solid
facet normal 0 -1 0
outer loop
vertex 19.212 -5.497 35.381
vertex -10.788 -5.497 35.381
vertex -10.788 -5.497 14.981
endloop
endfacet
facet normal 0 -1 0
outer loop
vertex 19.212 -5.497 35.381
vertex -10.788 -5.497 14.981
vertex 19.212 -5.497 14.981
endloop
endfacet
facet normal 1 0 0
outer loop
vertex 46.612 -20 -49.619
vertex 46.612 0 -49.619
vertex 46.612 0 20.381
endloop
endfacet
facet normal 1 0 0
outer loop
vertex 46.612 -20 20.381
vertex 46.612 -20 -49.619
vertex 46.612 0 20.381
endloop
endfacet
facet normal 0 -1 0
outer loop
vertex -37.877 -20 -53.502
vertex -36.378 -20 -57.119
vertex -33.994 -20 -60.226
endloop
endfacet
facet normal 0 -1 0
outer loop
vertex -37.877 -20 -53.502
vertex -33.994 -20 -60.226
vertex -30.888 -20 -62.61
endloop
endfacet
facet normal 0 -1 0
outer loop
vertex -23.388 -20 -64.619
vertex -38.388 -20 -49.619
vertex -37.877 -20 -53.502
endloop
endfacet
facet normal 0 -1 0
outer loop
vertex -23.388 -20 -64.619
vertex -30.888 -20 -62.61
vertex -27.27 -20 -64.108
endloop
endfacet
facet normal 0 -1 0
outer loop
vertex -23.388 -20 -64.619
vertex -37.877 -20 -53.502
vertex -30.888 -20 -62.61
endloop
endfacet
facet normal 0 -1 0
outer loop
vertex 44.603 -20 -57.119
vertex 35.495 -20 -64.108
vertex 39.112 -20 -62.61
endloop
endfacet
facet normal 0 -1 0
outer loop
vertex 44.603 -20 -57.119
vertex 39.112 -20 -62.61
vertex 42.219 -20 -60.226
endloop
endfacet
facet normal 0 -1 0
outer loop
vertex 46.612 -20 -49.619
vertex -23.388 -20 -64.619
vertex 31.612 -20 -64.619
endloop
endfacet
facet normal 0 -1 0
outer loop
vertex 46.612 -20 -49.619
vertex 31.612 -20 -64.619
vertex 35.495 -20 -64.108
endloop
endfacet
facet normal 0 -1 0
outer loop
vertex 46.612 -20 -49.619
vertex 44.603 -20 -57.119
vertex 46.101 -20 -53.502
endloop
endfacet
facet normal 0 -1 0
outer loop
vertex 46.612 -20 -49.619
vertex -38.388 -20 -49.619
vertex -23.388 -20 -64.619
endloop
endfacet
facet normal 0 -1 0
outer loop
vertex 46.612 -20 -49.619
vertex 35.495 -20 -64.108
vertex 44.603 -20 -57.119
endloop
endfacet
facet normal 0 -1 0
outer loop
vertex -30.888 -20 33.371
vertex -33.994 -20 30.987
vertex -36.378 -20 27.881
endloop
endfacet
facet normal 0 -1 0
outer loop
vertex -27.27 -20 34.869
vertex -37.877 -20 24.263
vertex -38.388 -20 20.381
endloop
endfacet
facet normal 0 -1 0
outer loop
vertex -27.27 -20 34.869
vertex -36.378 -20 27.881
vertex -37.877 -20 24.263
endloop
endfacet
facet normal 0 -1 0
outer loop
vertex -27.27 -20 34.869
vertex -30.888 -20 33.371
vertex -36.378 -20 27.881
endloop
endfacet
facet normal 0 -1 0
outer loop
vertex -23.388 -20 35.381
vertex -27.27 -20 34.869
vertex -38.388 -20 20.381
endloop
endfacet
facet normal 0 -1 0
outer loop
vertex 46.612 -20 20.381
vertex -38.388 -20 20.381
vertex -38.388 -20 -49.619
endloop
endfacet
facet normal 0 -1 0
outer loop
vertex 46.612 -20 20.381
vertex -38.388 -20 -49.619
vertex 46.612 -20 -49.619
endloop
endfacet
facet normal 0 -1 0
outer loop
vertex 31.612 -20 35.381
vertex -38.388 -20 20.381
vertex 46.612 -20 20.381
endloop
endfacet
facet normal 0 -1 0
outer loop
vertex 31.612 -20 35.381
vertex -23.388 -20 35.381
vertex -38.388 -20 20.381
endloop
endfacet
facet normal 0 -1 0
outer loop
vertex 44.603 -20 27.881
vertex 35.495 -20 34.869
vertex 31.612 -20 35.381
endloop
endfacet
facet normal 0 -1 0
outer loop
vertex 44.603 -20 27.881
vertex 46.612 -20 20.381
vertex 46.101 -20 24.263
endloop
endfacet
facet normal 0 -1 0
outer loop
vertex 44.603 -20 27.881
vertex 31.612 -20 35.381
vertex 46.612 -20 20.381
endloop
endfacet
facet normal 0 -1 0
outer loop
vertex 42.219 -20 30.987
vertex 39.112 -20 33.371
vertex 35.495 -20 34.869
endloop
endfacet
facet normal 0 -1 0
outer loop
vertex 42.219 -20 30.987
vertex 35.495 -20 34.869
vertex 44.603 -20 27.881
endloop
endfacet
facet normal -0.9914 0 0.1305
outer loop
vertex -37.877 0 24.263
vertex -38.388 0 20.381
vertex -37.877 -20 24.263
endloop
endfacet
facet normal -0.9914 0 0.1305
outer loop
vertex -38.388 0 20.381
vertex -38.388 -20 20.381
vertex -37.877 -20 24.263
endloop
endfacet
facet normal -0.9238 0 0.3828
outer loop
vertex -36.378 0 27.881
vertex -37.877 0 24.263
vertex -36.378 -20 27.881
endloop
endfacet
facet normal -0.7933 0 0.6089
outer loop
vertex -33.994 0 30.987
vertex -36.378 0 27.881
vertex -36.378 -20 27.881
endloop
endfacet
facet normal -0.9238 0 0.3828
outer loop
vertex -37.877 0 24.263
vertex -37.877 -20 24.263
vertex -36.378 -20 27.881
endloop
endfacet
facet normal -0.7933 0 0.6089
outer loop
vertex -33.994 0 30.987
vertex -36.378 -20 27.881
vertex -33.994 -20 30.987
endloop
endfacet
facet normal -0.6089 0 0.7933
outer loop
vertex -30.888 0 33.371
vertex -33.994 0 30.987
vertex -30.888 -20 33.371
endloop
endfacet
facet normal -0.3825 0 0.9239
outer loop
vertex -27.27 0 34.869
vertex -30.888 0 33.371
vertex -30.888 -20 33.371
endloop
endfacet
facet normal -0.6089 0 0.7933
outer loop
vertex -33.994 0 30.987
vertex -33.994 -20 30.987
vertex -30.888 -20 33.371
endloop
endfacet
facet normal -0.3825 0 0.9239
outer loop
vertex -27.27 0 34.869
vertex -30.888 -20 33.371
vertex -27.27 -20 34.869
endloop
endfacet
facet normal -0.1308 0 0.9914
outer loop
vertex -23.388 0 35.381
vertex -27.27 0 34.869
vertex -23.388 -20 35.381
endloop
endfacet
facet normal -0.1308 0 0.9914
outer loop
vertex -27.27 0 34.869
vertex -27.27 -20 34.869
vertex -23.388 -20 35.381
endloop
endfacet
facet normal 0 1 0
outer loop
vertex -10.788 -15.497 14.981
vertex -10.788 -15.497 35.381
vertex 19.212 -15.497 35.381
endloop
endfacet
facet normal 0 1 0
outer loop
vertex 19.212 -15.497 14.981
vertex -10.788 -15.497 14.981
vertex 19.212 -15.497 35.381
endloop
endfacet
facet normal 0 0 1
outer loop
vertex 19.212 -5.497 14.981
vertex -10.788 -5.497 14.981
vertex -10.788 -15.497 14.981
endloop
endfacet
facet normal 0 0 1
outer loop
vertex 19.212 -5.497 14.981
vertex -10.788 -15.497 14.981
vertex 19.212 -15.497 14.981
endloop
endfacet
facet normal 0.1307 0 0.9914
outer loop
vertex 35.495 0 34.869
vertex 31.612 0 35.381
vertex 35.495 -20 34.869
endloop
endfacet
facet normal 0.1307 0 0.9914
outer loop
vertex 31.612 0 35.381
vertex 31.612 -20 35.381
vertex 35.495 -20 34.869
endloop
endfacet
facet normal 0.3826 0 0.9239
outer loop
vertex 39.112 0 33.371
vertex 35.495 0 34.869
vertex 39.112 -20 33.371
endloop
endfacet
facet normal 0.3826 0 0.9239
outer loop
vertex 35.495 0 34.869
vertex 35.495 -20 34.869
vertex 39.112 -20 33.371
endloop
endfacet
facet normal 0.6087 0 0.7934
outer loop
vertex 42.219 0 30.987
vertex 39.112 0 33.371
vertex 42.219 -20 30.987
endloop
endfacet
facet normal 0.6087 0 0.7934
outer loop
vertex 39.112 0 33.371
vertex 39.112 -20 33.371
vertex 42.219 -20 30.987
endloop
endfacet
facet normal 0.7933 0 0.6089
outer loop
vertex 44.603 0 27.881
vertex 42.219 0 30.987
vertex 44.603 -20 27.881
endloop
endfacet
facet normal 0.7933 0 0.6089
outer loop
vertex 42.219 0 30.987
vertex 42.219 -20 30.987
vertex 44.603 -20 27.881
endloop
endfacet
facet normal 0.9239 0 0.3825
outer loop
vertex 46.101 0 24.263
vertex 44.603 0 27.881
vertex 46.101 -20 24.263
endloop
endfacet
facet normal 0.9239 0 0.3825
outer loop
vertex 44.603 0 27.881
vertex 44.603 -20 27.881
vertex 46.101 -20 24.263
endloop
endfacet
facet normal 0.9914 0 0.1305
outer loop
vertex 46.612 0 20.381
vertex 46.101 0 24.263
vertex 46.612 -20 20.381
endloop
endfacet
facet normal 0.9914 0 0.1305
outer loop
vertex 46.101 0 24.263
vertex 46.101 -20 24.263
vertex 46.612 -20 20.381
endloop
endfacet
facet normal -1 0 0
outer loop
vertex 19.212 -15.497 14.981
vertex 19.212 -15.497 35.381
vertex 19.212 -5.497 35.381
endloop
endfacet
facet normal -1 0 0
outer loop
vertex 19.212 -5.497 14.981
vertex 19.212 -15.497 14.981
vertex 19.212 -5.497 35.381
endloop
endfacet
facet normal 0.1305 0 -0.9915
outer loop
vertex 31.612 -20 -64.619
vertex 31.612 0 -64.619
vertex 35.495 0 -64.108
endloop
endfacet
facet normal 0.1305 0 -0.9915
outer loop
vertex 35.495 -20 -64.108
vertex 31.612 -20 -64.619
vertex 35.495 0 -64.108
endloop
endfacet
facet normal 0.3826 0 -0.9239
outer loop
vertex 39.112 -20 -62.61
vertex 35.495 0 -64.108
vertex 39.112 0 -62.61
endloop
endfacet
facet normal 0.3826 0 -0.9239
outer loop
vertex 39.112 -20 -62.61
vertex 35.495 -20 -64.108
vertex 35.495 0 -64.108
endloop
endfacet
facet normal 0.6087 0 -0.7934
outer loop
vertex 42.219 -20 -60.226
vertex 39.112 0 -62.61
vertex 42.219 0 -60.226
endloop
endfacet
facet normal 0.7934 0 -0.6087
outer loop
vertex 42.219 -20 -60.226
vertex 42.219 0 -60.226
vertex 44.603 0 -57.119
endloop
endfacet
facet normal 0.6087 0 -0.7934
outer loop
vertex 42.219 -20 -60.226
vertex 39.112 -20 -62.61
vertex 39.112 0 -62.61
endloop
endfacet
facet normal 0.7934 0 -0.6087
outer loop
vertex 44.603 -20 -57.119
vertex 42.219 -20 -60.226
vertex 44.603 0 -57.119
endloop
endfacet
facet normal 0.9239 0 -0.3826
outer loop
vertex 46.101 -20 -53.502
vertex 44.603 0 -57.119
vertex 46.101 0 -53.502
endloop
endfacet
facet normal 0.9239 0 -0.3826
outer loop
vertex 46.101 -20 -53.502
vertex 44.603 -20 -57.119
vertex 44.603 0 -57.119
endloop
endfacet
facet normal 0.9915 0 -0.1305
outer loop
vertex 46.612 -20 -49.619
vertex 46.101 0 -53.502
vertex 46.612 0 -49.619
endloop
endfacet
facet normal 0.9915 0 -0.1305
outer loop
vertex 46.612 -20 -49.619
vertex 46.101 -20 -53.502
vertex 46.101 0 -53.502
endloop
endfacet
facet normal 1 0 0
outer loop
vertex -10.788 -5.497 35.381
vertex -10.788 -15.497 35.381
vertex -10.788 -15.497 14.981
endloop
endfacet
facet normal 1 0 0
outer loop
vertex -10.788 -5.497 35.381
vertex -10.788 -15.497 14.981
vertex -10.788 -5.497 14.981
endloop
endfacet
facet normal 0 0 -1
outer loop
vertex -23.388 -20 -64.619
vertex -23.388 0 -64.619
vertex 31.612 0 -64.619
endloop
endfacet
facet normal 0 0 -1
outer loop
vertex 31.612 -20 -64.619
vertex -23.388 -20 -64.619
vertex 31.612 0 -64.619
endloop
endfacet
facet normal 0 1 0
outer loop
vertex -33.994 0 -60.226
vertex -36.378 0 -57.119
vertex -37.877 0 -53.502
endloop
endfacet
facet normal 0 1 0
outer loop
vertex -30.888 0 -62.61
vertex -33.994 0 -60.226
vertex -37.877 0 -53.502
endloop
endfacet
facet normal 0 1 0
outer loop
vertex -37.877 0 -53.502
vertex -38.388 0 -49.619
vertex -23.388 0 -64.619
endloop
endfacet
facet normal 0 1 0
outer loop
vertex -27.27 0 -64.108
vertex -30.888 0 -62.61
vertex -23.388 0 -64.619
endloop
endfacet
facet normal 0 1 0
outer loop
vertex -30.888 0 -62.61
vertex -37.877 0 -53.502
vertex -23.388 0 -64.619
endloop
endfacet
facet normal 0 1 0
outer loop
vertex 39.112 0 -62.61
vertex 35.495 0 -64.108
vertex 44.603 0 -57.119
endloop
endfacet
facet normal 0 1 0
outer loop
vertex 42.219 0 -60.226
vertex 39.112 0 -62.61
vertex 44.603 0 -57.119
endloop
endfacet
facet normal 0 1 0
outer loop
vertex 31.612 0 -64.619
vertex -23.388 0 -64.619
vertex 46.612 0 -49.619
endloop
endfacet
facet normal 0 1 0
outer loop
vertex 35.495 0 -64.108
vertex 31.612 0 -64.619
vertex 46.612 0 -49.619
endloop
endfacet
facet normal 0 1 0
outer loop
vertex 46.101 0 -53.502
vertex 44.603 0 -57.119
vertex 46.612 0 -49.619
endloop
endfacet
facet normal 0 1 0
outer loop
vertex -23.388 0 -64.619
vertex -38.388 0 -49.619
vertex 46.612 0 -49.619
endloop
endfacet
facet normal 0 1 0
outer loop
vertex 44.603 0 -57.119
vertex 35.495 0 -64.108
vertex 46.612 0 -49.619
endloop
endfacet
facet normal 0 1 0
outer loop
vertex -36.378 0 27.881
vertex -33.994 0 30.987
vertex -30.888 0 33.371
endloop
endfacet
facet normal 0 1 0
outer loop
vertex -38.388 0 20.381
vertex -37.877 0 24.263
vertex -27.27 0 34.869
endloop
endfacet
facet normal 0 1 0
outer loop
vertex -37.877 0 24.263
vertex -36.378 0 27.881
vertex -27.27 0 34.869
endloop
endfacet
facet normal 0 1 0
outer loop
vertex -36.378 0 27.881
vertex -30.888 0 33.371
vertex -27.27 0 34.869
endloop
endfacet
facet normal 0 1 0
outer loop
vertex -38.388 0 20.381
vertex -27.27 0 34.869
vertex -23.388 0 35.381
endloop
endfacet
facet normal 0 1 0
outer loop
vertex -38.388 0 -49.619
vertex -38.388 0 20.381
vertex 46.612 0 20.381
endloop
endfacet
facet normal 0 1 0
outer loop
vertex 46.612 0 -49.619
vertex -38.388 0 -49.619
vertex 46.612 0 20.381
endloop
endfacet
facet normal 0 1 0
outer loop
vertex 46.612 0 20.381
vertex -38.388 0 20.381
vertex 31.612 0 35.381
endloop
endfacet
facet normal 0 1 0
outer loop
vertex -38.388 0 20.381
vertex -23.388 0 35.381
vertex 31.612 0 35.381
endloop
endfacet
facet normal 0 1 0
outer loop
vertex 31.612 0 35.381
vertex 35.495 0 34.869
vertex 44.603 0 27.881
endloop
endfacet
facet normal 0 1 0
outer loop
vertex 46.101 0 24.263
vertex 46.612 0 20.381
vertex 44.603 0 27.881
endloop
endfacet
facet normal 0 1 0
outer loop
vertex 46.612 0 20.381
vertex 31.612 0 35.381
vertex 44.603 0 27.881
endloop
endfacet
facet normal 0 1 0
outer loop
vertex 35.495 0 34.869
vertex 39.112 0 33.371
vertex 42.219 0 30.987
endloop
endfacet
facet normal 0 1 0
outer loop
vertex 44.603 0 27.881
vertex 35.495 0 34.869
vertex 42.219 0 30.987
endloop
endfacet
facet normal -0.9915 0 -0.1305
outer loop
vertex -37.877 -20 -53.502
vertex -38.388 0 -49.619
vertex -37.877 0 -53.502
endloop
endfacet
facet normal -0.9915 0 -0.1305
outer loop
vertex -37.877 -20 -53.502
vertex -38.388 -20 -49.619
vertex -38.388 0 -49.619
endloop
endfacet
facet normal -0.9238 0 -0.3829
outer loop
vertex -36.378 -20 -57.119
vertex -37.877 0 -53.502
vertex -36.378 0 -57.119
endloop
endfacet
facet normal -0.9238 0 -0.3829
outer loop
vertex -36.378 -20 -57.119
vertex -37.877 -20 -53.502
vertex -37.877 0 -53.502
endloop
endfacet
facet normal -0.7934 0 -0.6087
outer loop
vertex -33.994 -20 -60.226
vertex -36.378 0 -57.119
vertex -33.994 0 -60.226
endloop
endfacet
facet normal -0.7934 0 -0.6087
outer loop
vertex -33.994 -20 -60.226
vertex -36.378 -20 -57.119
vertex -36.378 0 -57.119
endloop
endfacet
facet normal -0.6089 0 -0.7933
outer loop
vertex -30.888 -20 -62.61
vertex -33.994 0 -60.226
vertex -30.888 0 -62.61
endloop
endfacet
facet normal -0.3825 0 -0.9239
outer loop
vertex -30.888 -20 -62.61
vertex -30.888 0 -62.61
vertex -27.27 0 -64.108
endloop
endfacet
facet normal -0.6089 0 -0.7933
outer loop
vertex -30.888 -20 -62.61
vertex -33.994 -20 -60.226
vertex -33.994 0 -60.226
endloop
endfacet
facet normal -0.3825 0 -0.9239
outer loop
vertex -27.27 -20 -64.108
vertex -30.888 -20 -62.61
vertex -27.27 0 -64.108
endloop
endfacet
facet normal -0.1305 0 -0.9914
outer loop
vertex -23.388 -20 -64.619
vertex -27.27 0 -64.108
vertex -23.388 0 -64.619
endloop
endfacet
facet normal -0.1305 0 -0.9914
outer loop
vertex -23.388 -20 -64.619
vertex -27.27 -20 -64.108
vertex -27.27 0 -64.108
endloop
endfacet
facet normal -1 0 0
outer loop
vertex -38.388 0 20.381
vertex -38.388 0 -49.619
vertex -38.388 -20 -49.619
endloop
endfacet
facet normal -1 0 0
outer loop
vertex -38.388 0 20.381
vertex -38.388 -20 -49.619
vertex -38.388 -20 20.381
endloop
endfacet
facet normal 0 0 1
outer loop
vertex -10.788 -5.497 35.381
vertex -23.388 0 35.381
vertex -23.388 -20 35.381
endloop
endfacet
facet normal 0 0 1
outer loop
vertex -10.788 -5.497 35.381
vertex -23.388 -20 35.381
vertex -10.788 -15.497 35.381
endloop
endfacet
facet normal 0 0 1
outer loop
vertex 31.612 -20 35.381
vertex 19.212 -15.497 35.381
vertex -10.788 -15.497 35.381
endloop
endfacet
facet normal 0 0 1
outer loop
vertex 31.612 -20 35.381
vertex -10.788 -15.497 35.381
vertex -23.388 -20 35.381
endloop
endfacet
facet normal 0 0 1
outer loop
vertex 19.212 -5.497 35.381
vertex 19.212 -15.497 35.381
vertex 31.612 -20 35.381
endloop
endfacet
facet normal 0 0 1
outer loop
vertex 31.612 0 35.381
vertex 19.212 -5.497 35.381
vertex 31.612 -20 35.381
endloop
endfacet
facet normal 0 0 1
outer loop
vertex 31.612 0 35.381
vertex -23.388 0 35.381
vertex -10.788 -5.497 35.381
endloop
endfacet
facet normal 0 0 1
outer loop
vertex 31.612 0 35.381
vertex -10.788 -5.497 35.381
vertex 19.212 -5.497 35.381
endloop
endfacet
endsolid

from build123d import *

# Parameters (mm, degrees)
F0_W     = 85
F0_H     = 100
F1_DEPTH = 20
F2_W     = 30
F2_H     = 10
F3_DEPTH = 20.4
F4_R     = 15


with BuildPart() as f1:
    # F0 (on Front) → F1 (new body)
    with BuildSketch(Plane.XZ):
        with Locations((4.112373, -14.619432)):
            Rectangle(F0_W, F0_H)
    extrude(amount=F1_DEPTH)

    # F2 (on face) → F3 (cut)
    with BuildSketch(Plane.XY.offset(35.380568)):
        with Locations((4.212248, -10.496597)):
            Rectangle(F2_W, F2_H)
    extrude(amount=-F3_DEPTH, mode=Mode.SUBTRACT)

    # F4
    f4_edges = [f1.edges().sort_by_distance(p)[0] for p in [
        (46.612373, -10, 35.380568),
        (-38.387627, -10, 35.380568),
        (46.612373, -10, -64.619432),
        (-38.387627, -10, -64.619432),
    ]]
    fillet(f4_edges, radius=F4_R)


solid = f1.part
